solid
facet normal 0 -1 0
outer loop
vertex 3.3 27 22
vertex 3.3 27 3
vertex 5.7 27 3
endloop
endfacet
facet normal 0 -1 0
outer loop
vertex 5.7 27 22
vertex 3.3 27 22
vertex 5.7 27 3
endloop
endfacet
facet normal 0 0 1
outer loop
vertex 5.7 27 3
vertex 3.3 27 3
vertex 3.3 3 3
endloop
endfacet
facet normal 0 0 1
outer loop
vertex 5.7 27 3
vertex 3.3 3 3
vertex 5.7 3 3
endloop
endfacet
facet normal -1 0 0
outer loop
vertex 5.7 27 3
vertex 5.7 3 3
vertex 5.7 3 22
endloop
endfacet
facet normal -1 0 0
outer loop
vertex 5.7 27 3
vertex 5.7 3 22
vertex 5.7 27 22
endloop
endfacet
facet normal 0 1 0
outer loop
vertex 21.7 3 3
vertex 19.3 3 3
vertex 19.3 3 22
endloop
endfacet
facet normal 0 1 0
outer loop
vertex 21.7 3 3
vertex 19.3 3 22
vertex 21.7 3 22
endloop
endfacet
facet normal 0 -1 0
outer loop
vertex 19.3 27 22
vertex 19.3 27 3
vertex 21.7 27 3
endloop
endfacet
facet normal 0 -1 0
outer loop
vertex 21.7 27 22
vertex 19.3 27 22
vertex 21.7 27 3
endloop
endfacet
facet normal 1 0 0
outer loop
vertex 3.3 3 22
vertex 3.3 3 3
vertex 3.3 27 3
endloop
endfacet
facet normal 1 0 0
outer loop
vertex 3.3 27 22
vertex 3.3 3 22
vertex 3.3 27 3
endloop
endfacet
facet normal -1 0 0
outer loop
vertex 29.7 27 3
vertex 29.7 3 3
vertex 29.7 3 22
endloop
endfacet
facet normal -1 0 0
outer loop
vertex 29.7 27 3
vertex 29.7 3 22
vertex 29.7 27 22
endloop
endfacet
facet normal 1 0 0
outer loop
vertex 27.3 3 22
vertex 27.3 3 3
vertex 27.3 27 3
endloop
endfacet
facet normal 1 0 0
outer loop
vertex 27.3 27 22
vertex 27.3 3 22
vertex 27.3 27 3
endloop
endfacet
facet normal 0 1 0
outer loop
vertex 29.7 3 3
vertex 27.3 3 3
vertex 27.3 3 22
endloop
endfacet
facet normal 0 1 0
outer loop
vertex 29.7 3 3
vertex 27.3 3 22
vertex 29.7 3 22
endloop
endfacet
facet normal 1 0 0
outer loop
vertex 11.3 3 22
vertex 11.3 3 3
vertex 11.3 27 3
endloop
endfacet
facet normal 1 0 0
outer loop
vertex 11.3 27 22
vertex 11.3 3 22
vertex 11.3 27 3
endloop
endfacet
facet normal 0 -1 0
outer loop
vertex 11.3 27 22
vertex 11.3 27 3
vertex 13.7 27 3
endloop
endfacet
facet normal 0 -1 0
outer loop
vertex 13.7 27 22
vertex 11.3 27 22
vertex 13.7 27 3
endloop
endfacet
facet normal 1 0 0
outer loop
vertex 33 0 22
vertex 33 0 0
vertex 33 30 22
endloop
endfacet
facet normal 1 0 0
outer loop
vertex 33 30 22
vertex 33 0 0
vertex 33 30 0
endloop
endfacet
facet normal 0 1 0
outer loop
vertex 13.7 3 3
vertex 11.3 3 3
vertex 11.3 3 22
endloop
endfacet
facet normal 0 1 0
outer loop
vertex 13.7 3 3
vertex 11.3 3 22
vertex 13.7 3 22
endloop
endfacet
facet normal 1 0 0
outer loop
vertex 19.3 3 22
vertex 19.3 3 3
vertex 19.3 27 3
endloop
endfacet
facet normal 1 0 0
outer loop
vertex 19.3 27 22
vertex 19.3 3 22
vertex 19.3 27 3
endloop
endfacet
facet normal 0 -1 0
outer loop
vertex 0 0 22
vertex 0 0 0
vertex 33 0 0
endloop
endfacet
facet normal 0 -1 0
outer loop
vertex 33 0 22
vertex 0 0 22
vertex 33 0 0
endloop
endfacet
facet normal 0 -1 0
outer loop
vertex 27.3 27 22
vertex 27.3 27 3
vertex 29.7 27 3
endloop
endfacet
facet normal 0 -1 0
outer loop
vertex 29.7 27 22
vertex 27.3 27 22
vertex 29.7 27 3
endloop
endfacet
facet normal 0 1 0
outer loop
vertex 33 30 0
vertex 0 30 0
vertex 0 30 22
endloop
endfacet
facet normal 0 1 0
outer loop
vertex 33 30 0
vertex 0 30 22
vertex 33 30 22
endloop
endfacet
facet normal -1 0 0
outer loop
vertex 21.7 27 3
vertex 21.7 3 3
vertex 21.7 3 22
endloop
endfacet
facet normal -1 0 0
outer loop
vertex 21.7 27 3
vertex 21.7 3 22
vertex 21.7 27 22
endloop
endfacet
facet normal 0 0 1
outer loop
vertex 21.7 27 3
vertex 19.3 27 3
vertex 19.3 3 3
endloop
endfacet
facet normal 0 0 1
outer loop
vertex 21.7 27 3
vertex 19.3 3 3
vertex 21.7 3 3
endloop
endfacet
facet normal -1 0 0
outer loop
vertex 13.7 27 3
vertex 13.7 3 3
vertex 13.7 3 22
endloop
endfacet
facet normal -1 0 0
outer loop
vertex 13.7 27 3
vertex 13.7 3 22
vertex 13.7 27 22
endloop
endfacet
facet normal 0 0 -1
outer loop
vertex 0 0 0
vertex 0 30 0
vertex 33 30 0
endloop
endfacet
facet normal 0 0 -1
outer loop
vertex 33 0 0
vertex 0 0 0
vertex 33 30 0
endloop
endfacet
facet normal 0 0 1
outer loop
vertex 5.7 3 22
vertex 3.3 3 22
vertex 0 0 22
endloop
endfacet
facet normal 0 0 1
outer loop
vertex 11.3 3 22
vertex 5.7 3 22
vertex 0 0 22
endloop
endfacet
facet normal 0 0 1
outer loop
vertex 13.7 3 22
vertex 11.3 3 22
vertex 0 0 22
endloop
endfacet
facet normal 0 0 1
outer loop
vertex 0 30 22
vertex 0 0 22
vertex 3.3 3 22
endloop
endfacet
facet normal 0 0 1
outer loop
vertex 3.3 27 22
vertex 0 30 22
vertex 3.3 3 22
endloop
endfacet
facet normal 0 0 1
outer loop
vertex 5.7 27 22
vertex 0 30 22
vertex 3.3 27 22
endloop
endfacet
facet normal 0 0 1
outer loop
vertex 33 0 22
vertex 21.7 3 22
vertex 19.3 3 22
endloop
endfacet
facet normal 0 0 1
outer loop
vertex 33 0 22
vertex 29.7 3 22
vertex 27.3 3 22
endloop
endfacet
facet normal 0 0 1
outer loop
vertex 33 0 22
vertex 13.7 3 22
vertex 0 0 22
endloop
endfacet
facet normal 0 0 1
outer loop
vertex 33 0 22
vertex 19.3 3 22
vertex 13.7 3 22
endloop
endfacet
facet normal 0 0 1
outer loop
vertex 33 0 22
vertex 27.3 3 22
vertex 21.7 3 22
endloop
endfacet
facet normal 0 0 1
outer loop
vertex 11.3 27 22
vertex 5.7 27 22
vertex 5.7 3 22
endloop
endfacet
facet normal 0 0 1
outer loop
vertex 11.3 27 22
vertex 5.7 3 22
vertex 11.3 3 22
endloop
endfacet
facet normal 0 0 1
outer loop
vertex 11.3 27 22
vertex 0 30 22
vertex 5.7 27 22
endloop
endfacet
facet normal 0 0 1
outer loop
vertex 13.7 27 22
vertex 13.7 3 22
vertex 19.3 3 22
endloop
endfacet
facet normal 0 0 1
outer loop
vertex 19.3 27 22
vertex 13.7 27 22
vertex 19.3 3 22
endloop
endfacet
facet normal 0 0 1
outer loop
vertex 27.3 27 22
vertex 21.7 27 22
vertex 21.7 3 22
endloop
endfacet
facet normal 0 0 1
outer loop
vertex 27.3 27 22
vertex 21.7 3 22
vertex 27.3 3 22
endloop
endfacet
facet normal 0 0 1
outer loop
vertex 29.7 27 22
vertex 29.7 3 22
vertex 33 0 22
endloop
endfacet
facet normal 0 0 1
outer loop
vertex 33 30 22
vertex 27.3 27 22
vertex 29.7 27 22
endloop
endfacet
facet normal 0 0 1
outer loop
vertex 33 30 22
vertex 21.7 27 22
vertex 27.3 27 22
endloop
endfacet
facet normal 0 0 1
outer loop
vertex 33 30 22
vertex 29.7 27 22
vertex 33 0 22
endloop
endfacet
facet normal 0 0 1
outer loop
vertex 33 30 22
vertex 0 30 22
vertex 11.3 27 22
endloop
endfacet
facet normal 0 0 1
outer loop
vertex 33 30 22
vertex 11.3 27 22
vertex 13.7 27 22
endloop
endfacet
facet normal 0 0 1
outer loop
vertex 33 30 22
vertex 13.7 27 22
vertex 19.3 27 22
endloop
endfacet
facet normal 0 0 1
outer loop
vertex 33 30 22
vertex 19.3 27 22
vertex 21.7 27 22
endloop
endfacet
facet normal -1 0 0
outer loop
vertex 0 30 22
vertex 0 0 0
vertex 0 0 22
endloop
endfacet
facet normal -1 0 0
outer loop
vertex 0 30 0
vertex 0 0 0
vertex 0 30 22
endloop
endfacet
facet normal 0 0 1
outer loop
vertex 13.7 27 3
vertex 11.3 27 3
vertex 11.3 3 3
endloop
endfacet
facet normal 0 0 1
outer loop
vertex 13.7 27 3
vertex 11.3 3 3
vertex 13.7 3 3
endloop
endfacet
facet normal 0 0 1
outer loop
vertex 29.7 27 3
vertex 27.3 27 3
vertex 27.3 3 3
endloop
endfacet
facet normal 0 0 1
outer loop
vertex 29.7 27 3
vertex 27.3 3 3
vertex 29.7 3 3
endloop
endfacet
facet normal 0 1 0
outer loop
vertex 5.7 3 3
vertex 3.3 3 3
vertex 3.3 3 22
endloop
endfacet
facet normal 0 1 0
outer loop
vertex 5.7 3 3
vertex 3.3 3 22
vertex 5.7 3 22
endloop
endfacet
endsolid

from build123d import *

# Parameters (mm, degrees)
BOX007_W     = 2.4
BOX007_H     = 24
BOX007_DEPTH = 30
BOX008_W     = 2.4
BOX008_H     = 24
BOX008_DEPTH = 30
BOX009_W     = 2.4
BOX009_H     = 24
BOX009_DEPTH = 30
BOX_W        = 2.4
BOX_H        = 24
BOX_DEPTH    = 30
BOX004_W     = 33
BOX004_H     = 30
BOX004_DEPTH = 22


with BuildPart() as box007:
    # Box007 → Box007 (new body)
    with BuildSketch(Plane(origin=(11.3, 3, 0), x_dir=(1, 0, 0), z_dir=(0, 0, 1))):
        with Locations((1.2, 12)):
            Rectangle(BOX007_W, BOX007_H)
    extrude(amount=BOX007_DEPTH)


with BuildPart() as box008:
    # Box008 → Box008 (new body)
    with BuildSketch(Plane(origin=(19.3, 3, 0), x_dir=(1, 0, 0), z_dir=(0, 0, 1))):
        with Locations((1.2, 12)):
            Rectangle(BOX008_W, BOX008_H)
    extrude(amount=BOX008_DEPTH)


with BuildPart() as box009:
    # Box009 → Box009 (new body)
    with BuildSketch(Plane(origin=(27.3, 3, 0), x_dir=(1, 0, 0), z_dir=(0, 0, 1))):
        with Locations((1.2, 12)):
            Rectangle(BOX009_W, BOX009_H)
    extrude(amount=BOX009_DEPTH)


with BuildPart() as fusion:
    # Box → Box (new body)
    with BuildSketch(Plane(origin=(3.3, 3, 0), x_dir=(1, 0, 0), z_dir=(0, 0, 1))):
        with Locations((1.2, 12)):
            Rectangle(BOX_W, BOX_H)
    extrude(amount=BOX_DEPTH)

    # Fusion: union Box007, Box008, Box009
    add(box007.part)
    add(box008.part)
    add(box009.part)


with BuildPart() as fusion_1:
    # Fusion placement: moved
    add(fusion.part.moved(Location((0, 0, 3))))


with BuildPart() as cut:
    # Box004 → Box004 (new body)
    with BuildSketch(Plane.XY):
        with Locations((16.5, 15)):
            Rectangle(BOX004_W, BOX004_H)
    extrude(amount=BOX004_DEPTH)

    # Cut: cut Fusion
    add(fusion_1.part, mode=Mode.SUBTRACT)


solid = cut.part
